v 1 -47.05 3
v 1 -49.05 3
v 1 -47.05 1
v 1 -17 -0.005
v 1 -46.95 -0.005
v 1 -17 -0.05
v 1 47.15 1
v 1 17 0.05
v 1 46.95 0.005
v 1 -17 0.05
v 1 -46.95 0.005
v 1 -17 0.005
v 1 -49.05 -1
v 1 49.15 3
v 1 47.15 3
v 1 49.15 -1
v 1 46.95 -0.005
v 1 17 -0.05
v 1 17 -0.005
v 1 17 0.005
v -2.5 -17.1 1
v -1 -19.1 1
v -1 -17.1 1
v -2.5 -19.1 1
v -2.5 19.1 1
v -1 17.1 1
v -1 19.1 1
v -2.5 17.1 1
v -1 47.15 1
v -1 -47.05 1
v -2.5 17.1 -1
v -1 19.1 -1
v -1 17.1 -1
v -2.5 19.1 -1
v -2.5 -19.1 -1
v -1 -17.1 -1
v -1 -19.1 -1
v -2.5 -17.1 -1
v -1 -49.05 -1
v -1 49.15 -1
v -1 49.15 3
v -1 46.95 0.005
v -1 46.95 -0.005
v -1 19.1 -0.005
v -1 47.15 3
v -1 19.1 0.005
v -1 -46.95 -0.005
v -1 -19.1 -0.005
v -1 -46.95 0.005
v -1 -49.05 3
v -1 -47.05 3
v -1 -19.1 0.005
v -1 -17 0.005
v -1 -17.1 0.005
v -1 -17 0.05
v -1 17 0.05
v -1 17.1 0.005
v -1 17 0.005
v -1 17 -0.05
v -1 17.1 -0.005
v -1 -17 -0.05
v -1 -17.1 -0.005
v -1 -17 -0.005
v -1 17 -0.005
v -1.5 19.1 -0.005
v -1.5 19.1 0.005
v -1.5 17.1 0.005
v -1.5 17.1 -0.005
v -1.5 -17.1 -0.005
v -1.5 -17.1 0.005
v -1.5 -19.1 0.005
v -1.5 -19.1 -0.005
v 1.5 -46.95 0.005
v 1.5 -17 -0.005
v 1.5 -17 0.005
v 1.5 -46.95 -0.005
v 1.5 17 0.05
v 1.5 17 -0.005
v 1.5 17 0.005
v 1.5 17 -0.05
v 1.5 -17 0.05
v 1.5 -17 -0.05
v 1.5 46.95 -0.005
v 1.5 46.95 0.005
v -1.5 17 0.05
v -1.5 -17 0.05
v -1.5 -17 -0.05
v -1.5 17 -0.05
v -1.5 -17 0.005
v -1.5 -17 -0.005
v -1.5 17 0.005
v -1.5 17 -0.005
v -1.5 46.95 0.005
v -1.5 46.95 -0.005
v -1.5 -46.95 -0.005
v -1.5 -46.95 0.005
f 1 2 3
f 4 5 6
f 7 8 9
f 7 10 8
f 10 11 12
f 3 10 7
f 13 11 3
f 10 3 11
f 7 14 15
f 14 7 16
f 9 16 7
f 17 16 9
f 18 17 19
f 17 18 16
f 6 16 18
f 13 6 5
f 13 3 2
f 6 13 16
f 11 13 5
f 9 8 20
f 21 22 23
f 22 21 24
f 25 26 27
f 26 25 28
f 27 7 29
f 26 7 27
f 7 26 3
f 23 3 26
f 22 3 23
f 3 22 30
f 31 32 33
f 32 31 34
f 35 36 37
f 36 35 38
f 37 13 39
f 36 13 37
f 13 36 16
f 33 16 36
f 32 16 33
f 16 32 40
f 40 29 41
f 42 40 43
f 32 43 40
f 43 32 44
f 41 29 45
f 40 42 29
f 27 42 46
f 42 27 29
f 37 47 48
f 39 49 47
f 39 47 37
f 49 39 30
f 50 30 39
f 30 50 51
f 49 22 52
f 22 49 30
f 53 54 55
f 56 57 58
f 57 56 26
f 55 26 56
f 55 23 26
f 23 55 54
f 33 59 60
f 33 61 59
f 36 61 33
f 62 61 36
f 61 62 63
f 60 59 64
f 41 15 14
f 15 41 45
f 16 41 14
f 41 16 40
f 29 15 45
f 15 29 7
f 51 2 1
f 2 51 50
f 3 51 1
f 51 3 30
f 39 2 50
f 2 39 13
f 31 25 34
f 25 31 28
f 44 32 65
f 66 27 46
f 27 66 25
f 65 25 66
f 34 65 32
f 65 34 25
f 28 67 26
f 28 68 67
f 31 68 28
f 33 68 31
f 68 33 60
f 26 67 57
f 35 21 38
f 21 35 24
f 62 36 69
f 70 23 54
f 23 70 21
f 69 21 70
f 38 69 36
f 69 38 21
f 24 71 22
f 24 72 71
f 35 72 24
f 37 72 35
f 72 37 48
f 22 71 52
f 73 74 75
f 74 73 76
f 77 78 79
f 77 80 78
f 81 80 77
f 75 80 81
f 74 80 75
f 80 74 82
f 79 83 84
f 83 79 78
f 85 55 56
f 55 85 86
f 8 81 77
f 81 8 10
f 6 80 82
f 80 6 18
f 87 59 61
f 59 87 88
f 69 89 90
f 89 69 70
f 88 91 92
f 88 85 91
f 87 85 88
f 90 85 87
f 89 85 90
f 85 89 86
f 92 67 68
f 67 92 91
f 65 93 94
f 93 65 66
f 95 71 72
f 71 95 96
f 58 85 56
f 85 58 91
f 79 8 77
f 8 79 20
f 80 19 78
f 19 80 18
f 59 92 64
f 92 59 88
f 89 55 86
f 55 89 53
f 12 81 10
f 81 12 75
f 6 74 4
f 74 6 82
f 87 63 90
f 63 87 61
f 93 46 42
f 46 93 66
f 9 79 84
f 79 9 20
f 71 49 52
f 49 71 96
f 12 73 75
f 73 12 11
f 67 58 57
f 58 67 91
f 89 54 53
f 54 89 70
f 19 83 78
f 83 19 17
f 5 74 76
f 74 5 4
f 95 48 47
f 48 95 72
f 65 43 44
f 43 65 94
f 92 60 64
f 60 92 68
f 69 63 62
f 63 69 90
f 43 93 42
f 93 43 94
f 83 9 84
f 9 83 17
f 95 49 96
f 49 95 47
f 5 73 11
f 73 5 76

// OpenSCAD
// file: fb_globals.scad
/// @file fb_globals.scad
///
/// @brief project footbridge globals
///
/// @author © Dave Harris 2022
///
/// Included in all project files.


$fa = 1;   // Fragment angle
$fs = 0.4; // Fragment size resolution

// global constants
//------------------

H_canopy = 47;

H_bridge = 49.5; // platform<>bridge
W_bridge = 36;   // width of bridge
                 // > walkway
W_walk   = 34.5; // width
H_walk   = 36;   // height of walkway


Steps    = 27;   // number of steps
W_stairs = 32;   // width ~ 9'6" @ H0
L_tread  = 3.5;  // tread ~ 12" @ H0
L_stairs = L_tread * (Steps +1);
H_rise   = H_bridge / (Steps +1); 
  // rise is 1.7678, not H0 1.75 (6")

W_lift   = 34;

W_build  = W_stairs +2;
L_build  = L_stairs+W_bridge+W_lift +2;

W_pillar = 4;

L_spacing = L_build /2;

Spans = 6;

L_canopy = ((Spans -1) * L_spacing) + W_pillar;

echo("len",L_canopy);

H_door   = 28;
W_door   = 18;

H_window = 6;
W_window = 16;


W_plat45  = 93.9;
W_track34 = 87.9;
W_plat23  = 93.8;
W_track12 = 87.9;

W_plat23edge =
   ( W_plat23 - W_stairs +2 ) /2 ;
W_plat45edge =
   ( W_plat45 - W_stairs +2 ) /2 ;
   
L_span34 = W_track34 + W_plat45edge + W_plat23edge;

L_span12 = 136.5;

W_grider = 2.2;

W_LEDstrip = 7.5;



// eof
// main file
/// @file buildGuide.scad
///
/// @brief footbridge build guide
///
/// @author © Dave Harris 2022
///

include<fb_globals.scad>


buildGuide(W_plat45, W_build);

color("blue")
{
    cube(
      [ 3
      , W_build 
      , 0.1 ], center=true
    );
    cube(
      [ 3
      , W_plat45 
      , 0.01 ], center=true
    );
}


module buildGuide(
        platform
        , building
      )
{
    cube(
      [ 2
      , platform + 1
      , 2  ] , center = true
    );

    translate(
      [ -1
      , (platform /2) +0.2
      , -1  ]
    ) cube(
        [ 2, 2, 4 ]
      );
      
    translate(
      [ -1
      , -(platform /2) -2.1
      , -1  ]
    ) cube(
        [ 2, 2, 4 ]
      );
      
     translate(
      [ -1
      , (building /2) +1.1
      , 0  ]
    ) cube(
        [ 3, 2, 2 ], center=true
      );
      
    translate(
      [ -1
      , -(building /2) -1.1
      , 0  ]
    ) cube(
        [ 3, 2, 2 ], center=true
      );
 }
 
 // eof
 
